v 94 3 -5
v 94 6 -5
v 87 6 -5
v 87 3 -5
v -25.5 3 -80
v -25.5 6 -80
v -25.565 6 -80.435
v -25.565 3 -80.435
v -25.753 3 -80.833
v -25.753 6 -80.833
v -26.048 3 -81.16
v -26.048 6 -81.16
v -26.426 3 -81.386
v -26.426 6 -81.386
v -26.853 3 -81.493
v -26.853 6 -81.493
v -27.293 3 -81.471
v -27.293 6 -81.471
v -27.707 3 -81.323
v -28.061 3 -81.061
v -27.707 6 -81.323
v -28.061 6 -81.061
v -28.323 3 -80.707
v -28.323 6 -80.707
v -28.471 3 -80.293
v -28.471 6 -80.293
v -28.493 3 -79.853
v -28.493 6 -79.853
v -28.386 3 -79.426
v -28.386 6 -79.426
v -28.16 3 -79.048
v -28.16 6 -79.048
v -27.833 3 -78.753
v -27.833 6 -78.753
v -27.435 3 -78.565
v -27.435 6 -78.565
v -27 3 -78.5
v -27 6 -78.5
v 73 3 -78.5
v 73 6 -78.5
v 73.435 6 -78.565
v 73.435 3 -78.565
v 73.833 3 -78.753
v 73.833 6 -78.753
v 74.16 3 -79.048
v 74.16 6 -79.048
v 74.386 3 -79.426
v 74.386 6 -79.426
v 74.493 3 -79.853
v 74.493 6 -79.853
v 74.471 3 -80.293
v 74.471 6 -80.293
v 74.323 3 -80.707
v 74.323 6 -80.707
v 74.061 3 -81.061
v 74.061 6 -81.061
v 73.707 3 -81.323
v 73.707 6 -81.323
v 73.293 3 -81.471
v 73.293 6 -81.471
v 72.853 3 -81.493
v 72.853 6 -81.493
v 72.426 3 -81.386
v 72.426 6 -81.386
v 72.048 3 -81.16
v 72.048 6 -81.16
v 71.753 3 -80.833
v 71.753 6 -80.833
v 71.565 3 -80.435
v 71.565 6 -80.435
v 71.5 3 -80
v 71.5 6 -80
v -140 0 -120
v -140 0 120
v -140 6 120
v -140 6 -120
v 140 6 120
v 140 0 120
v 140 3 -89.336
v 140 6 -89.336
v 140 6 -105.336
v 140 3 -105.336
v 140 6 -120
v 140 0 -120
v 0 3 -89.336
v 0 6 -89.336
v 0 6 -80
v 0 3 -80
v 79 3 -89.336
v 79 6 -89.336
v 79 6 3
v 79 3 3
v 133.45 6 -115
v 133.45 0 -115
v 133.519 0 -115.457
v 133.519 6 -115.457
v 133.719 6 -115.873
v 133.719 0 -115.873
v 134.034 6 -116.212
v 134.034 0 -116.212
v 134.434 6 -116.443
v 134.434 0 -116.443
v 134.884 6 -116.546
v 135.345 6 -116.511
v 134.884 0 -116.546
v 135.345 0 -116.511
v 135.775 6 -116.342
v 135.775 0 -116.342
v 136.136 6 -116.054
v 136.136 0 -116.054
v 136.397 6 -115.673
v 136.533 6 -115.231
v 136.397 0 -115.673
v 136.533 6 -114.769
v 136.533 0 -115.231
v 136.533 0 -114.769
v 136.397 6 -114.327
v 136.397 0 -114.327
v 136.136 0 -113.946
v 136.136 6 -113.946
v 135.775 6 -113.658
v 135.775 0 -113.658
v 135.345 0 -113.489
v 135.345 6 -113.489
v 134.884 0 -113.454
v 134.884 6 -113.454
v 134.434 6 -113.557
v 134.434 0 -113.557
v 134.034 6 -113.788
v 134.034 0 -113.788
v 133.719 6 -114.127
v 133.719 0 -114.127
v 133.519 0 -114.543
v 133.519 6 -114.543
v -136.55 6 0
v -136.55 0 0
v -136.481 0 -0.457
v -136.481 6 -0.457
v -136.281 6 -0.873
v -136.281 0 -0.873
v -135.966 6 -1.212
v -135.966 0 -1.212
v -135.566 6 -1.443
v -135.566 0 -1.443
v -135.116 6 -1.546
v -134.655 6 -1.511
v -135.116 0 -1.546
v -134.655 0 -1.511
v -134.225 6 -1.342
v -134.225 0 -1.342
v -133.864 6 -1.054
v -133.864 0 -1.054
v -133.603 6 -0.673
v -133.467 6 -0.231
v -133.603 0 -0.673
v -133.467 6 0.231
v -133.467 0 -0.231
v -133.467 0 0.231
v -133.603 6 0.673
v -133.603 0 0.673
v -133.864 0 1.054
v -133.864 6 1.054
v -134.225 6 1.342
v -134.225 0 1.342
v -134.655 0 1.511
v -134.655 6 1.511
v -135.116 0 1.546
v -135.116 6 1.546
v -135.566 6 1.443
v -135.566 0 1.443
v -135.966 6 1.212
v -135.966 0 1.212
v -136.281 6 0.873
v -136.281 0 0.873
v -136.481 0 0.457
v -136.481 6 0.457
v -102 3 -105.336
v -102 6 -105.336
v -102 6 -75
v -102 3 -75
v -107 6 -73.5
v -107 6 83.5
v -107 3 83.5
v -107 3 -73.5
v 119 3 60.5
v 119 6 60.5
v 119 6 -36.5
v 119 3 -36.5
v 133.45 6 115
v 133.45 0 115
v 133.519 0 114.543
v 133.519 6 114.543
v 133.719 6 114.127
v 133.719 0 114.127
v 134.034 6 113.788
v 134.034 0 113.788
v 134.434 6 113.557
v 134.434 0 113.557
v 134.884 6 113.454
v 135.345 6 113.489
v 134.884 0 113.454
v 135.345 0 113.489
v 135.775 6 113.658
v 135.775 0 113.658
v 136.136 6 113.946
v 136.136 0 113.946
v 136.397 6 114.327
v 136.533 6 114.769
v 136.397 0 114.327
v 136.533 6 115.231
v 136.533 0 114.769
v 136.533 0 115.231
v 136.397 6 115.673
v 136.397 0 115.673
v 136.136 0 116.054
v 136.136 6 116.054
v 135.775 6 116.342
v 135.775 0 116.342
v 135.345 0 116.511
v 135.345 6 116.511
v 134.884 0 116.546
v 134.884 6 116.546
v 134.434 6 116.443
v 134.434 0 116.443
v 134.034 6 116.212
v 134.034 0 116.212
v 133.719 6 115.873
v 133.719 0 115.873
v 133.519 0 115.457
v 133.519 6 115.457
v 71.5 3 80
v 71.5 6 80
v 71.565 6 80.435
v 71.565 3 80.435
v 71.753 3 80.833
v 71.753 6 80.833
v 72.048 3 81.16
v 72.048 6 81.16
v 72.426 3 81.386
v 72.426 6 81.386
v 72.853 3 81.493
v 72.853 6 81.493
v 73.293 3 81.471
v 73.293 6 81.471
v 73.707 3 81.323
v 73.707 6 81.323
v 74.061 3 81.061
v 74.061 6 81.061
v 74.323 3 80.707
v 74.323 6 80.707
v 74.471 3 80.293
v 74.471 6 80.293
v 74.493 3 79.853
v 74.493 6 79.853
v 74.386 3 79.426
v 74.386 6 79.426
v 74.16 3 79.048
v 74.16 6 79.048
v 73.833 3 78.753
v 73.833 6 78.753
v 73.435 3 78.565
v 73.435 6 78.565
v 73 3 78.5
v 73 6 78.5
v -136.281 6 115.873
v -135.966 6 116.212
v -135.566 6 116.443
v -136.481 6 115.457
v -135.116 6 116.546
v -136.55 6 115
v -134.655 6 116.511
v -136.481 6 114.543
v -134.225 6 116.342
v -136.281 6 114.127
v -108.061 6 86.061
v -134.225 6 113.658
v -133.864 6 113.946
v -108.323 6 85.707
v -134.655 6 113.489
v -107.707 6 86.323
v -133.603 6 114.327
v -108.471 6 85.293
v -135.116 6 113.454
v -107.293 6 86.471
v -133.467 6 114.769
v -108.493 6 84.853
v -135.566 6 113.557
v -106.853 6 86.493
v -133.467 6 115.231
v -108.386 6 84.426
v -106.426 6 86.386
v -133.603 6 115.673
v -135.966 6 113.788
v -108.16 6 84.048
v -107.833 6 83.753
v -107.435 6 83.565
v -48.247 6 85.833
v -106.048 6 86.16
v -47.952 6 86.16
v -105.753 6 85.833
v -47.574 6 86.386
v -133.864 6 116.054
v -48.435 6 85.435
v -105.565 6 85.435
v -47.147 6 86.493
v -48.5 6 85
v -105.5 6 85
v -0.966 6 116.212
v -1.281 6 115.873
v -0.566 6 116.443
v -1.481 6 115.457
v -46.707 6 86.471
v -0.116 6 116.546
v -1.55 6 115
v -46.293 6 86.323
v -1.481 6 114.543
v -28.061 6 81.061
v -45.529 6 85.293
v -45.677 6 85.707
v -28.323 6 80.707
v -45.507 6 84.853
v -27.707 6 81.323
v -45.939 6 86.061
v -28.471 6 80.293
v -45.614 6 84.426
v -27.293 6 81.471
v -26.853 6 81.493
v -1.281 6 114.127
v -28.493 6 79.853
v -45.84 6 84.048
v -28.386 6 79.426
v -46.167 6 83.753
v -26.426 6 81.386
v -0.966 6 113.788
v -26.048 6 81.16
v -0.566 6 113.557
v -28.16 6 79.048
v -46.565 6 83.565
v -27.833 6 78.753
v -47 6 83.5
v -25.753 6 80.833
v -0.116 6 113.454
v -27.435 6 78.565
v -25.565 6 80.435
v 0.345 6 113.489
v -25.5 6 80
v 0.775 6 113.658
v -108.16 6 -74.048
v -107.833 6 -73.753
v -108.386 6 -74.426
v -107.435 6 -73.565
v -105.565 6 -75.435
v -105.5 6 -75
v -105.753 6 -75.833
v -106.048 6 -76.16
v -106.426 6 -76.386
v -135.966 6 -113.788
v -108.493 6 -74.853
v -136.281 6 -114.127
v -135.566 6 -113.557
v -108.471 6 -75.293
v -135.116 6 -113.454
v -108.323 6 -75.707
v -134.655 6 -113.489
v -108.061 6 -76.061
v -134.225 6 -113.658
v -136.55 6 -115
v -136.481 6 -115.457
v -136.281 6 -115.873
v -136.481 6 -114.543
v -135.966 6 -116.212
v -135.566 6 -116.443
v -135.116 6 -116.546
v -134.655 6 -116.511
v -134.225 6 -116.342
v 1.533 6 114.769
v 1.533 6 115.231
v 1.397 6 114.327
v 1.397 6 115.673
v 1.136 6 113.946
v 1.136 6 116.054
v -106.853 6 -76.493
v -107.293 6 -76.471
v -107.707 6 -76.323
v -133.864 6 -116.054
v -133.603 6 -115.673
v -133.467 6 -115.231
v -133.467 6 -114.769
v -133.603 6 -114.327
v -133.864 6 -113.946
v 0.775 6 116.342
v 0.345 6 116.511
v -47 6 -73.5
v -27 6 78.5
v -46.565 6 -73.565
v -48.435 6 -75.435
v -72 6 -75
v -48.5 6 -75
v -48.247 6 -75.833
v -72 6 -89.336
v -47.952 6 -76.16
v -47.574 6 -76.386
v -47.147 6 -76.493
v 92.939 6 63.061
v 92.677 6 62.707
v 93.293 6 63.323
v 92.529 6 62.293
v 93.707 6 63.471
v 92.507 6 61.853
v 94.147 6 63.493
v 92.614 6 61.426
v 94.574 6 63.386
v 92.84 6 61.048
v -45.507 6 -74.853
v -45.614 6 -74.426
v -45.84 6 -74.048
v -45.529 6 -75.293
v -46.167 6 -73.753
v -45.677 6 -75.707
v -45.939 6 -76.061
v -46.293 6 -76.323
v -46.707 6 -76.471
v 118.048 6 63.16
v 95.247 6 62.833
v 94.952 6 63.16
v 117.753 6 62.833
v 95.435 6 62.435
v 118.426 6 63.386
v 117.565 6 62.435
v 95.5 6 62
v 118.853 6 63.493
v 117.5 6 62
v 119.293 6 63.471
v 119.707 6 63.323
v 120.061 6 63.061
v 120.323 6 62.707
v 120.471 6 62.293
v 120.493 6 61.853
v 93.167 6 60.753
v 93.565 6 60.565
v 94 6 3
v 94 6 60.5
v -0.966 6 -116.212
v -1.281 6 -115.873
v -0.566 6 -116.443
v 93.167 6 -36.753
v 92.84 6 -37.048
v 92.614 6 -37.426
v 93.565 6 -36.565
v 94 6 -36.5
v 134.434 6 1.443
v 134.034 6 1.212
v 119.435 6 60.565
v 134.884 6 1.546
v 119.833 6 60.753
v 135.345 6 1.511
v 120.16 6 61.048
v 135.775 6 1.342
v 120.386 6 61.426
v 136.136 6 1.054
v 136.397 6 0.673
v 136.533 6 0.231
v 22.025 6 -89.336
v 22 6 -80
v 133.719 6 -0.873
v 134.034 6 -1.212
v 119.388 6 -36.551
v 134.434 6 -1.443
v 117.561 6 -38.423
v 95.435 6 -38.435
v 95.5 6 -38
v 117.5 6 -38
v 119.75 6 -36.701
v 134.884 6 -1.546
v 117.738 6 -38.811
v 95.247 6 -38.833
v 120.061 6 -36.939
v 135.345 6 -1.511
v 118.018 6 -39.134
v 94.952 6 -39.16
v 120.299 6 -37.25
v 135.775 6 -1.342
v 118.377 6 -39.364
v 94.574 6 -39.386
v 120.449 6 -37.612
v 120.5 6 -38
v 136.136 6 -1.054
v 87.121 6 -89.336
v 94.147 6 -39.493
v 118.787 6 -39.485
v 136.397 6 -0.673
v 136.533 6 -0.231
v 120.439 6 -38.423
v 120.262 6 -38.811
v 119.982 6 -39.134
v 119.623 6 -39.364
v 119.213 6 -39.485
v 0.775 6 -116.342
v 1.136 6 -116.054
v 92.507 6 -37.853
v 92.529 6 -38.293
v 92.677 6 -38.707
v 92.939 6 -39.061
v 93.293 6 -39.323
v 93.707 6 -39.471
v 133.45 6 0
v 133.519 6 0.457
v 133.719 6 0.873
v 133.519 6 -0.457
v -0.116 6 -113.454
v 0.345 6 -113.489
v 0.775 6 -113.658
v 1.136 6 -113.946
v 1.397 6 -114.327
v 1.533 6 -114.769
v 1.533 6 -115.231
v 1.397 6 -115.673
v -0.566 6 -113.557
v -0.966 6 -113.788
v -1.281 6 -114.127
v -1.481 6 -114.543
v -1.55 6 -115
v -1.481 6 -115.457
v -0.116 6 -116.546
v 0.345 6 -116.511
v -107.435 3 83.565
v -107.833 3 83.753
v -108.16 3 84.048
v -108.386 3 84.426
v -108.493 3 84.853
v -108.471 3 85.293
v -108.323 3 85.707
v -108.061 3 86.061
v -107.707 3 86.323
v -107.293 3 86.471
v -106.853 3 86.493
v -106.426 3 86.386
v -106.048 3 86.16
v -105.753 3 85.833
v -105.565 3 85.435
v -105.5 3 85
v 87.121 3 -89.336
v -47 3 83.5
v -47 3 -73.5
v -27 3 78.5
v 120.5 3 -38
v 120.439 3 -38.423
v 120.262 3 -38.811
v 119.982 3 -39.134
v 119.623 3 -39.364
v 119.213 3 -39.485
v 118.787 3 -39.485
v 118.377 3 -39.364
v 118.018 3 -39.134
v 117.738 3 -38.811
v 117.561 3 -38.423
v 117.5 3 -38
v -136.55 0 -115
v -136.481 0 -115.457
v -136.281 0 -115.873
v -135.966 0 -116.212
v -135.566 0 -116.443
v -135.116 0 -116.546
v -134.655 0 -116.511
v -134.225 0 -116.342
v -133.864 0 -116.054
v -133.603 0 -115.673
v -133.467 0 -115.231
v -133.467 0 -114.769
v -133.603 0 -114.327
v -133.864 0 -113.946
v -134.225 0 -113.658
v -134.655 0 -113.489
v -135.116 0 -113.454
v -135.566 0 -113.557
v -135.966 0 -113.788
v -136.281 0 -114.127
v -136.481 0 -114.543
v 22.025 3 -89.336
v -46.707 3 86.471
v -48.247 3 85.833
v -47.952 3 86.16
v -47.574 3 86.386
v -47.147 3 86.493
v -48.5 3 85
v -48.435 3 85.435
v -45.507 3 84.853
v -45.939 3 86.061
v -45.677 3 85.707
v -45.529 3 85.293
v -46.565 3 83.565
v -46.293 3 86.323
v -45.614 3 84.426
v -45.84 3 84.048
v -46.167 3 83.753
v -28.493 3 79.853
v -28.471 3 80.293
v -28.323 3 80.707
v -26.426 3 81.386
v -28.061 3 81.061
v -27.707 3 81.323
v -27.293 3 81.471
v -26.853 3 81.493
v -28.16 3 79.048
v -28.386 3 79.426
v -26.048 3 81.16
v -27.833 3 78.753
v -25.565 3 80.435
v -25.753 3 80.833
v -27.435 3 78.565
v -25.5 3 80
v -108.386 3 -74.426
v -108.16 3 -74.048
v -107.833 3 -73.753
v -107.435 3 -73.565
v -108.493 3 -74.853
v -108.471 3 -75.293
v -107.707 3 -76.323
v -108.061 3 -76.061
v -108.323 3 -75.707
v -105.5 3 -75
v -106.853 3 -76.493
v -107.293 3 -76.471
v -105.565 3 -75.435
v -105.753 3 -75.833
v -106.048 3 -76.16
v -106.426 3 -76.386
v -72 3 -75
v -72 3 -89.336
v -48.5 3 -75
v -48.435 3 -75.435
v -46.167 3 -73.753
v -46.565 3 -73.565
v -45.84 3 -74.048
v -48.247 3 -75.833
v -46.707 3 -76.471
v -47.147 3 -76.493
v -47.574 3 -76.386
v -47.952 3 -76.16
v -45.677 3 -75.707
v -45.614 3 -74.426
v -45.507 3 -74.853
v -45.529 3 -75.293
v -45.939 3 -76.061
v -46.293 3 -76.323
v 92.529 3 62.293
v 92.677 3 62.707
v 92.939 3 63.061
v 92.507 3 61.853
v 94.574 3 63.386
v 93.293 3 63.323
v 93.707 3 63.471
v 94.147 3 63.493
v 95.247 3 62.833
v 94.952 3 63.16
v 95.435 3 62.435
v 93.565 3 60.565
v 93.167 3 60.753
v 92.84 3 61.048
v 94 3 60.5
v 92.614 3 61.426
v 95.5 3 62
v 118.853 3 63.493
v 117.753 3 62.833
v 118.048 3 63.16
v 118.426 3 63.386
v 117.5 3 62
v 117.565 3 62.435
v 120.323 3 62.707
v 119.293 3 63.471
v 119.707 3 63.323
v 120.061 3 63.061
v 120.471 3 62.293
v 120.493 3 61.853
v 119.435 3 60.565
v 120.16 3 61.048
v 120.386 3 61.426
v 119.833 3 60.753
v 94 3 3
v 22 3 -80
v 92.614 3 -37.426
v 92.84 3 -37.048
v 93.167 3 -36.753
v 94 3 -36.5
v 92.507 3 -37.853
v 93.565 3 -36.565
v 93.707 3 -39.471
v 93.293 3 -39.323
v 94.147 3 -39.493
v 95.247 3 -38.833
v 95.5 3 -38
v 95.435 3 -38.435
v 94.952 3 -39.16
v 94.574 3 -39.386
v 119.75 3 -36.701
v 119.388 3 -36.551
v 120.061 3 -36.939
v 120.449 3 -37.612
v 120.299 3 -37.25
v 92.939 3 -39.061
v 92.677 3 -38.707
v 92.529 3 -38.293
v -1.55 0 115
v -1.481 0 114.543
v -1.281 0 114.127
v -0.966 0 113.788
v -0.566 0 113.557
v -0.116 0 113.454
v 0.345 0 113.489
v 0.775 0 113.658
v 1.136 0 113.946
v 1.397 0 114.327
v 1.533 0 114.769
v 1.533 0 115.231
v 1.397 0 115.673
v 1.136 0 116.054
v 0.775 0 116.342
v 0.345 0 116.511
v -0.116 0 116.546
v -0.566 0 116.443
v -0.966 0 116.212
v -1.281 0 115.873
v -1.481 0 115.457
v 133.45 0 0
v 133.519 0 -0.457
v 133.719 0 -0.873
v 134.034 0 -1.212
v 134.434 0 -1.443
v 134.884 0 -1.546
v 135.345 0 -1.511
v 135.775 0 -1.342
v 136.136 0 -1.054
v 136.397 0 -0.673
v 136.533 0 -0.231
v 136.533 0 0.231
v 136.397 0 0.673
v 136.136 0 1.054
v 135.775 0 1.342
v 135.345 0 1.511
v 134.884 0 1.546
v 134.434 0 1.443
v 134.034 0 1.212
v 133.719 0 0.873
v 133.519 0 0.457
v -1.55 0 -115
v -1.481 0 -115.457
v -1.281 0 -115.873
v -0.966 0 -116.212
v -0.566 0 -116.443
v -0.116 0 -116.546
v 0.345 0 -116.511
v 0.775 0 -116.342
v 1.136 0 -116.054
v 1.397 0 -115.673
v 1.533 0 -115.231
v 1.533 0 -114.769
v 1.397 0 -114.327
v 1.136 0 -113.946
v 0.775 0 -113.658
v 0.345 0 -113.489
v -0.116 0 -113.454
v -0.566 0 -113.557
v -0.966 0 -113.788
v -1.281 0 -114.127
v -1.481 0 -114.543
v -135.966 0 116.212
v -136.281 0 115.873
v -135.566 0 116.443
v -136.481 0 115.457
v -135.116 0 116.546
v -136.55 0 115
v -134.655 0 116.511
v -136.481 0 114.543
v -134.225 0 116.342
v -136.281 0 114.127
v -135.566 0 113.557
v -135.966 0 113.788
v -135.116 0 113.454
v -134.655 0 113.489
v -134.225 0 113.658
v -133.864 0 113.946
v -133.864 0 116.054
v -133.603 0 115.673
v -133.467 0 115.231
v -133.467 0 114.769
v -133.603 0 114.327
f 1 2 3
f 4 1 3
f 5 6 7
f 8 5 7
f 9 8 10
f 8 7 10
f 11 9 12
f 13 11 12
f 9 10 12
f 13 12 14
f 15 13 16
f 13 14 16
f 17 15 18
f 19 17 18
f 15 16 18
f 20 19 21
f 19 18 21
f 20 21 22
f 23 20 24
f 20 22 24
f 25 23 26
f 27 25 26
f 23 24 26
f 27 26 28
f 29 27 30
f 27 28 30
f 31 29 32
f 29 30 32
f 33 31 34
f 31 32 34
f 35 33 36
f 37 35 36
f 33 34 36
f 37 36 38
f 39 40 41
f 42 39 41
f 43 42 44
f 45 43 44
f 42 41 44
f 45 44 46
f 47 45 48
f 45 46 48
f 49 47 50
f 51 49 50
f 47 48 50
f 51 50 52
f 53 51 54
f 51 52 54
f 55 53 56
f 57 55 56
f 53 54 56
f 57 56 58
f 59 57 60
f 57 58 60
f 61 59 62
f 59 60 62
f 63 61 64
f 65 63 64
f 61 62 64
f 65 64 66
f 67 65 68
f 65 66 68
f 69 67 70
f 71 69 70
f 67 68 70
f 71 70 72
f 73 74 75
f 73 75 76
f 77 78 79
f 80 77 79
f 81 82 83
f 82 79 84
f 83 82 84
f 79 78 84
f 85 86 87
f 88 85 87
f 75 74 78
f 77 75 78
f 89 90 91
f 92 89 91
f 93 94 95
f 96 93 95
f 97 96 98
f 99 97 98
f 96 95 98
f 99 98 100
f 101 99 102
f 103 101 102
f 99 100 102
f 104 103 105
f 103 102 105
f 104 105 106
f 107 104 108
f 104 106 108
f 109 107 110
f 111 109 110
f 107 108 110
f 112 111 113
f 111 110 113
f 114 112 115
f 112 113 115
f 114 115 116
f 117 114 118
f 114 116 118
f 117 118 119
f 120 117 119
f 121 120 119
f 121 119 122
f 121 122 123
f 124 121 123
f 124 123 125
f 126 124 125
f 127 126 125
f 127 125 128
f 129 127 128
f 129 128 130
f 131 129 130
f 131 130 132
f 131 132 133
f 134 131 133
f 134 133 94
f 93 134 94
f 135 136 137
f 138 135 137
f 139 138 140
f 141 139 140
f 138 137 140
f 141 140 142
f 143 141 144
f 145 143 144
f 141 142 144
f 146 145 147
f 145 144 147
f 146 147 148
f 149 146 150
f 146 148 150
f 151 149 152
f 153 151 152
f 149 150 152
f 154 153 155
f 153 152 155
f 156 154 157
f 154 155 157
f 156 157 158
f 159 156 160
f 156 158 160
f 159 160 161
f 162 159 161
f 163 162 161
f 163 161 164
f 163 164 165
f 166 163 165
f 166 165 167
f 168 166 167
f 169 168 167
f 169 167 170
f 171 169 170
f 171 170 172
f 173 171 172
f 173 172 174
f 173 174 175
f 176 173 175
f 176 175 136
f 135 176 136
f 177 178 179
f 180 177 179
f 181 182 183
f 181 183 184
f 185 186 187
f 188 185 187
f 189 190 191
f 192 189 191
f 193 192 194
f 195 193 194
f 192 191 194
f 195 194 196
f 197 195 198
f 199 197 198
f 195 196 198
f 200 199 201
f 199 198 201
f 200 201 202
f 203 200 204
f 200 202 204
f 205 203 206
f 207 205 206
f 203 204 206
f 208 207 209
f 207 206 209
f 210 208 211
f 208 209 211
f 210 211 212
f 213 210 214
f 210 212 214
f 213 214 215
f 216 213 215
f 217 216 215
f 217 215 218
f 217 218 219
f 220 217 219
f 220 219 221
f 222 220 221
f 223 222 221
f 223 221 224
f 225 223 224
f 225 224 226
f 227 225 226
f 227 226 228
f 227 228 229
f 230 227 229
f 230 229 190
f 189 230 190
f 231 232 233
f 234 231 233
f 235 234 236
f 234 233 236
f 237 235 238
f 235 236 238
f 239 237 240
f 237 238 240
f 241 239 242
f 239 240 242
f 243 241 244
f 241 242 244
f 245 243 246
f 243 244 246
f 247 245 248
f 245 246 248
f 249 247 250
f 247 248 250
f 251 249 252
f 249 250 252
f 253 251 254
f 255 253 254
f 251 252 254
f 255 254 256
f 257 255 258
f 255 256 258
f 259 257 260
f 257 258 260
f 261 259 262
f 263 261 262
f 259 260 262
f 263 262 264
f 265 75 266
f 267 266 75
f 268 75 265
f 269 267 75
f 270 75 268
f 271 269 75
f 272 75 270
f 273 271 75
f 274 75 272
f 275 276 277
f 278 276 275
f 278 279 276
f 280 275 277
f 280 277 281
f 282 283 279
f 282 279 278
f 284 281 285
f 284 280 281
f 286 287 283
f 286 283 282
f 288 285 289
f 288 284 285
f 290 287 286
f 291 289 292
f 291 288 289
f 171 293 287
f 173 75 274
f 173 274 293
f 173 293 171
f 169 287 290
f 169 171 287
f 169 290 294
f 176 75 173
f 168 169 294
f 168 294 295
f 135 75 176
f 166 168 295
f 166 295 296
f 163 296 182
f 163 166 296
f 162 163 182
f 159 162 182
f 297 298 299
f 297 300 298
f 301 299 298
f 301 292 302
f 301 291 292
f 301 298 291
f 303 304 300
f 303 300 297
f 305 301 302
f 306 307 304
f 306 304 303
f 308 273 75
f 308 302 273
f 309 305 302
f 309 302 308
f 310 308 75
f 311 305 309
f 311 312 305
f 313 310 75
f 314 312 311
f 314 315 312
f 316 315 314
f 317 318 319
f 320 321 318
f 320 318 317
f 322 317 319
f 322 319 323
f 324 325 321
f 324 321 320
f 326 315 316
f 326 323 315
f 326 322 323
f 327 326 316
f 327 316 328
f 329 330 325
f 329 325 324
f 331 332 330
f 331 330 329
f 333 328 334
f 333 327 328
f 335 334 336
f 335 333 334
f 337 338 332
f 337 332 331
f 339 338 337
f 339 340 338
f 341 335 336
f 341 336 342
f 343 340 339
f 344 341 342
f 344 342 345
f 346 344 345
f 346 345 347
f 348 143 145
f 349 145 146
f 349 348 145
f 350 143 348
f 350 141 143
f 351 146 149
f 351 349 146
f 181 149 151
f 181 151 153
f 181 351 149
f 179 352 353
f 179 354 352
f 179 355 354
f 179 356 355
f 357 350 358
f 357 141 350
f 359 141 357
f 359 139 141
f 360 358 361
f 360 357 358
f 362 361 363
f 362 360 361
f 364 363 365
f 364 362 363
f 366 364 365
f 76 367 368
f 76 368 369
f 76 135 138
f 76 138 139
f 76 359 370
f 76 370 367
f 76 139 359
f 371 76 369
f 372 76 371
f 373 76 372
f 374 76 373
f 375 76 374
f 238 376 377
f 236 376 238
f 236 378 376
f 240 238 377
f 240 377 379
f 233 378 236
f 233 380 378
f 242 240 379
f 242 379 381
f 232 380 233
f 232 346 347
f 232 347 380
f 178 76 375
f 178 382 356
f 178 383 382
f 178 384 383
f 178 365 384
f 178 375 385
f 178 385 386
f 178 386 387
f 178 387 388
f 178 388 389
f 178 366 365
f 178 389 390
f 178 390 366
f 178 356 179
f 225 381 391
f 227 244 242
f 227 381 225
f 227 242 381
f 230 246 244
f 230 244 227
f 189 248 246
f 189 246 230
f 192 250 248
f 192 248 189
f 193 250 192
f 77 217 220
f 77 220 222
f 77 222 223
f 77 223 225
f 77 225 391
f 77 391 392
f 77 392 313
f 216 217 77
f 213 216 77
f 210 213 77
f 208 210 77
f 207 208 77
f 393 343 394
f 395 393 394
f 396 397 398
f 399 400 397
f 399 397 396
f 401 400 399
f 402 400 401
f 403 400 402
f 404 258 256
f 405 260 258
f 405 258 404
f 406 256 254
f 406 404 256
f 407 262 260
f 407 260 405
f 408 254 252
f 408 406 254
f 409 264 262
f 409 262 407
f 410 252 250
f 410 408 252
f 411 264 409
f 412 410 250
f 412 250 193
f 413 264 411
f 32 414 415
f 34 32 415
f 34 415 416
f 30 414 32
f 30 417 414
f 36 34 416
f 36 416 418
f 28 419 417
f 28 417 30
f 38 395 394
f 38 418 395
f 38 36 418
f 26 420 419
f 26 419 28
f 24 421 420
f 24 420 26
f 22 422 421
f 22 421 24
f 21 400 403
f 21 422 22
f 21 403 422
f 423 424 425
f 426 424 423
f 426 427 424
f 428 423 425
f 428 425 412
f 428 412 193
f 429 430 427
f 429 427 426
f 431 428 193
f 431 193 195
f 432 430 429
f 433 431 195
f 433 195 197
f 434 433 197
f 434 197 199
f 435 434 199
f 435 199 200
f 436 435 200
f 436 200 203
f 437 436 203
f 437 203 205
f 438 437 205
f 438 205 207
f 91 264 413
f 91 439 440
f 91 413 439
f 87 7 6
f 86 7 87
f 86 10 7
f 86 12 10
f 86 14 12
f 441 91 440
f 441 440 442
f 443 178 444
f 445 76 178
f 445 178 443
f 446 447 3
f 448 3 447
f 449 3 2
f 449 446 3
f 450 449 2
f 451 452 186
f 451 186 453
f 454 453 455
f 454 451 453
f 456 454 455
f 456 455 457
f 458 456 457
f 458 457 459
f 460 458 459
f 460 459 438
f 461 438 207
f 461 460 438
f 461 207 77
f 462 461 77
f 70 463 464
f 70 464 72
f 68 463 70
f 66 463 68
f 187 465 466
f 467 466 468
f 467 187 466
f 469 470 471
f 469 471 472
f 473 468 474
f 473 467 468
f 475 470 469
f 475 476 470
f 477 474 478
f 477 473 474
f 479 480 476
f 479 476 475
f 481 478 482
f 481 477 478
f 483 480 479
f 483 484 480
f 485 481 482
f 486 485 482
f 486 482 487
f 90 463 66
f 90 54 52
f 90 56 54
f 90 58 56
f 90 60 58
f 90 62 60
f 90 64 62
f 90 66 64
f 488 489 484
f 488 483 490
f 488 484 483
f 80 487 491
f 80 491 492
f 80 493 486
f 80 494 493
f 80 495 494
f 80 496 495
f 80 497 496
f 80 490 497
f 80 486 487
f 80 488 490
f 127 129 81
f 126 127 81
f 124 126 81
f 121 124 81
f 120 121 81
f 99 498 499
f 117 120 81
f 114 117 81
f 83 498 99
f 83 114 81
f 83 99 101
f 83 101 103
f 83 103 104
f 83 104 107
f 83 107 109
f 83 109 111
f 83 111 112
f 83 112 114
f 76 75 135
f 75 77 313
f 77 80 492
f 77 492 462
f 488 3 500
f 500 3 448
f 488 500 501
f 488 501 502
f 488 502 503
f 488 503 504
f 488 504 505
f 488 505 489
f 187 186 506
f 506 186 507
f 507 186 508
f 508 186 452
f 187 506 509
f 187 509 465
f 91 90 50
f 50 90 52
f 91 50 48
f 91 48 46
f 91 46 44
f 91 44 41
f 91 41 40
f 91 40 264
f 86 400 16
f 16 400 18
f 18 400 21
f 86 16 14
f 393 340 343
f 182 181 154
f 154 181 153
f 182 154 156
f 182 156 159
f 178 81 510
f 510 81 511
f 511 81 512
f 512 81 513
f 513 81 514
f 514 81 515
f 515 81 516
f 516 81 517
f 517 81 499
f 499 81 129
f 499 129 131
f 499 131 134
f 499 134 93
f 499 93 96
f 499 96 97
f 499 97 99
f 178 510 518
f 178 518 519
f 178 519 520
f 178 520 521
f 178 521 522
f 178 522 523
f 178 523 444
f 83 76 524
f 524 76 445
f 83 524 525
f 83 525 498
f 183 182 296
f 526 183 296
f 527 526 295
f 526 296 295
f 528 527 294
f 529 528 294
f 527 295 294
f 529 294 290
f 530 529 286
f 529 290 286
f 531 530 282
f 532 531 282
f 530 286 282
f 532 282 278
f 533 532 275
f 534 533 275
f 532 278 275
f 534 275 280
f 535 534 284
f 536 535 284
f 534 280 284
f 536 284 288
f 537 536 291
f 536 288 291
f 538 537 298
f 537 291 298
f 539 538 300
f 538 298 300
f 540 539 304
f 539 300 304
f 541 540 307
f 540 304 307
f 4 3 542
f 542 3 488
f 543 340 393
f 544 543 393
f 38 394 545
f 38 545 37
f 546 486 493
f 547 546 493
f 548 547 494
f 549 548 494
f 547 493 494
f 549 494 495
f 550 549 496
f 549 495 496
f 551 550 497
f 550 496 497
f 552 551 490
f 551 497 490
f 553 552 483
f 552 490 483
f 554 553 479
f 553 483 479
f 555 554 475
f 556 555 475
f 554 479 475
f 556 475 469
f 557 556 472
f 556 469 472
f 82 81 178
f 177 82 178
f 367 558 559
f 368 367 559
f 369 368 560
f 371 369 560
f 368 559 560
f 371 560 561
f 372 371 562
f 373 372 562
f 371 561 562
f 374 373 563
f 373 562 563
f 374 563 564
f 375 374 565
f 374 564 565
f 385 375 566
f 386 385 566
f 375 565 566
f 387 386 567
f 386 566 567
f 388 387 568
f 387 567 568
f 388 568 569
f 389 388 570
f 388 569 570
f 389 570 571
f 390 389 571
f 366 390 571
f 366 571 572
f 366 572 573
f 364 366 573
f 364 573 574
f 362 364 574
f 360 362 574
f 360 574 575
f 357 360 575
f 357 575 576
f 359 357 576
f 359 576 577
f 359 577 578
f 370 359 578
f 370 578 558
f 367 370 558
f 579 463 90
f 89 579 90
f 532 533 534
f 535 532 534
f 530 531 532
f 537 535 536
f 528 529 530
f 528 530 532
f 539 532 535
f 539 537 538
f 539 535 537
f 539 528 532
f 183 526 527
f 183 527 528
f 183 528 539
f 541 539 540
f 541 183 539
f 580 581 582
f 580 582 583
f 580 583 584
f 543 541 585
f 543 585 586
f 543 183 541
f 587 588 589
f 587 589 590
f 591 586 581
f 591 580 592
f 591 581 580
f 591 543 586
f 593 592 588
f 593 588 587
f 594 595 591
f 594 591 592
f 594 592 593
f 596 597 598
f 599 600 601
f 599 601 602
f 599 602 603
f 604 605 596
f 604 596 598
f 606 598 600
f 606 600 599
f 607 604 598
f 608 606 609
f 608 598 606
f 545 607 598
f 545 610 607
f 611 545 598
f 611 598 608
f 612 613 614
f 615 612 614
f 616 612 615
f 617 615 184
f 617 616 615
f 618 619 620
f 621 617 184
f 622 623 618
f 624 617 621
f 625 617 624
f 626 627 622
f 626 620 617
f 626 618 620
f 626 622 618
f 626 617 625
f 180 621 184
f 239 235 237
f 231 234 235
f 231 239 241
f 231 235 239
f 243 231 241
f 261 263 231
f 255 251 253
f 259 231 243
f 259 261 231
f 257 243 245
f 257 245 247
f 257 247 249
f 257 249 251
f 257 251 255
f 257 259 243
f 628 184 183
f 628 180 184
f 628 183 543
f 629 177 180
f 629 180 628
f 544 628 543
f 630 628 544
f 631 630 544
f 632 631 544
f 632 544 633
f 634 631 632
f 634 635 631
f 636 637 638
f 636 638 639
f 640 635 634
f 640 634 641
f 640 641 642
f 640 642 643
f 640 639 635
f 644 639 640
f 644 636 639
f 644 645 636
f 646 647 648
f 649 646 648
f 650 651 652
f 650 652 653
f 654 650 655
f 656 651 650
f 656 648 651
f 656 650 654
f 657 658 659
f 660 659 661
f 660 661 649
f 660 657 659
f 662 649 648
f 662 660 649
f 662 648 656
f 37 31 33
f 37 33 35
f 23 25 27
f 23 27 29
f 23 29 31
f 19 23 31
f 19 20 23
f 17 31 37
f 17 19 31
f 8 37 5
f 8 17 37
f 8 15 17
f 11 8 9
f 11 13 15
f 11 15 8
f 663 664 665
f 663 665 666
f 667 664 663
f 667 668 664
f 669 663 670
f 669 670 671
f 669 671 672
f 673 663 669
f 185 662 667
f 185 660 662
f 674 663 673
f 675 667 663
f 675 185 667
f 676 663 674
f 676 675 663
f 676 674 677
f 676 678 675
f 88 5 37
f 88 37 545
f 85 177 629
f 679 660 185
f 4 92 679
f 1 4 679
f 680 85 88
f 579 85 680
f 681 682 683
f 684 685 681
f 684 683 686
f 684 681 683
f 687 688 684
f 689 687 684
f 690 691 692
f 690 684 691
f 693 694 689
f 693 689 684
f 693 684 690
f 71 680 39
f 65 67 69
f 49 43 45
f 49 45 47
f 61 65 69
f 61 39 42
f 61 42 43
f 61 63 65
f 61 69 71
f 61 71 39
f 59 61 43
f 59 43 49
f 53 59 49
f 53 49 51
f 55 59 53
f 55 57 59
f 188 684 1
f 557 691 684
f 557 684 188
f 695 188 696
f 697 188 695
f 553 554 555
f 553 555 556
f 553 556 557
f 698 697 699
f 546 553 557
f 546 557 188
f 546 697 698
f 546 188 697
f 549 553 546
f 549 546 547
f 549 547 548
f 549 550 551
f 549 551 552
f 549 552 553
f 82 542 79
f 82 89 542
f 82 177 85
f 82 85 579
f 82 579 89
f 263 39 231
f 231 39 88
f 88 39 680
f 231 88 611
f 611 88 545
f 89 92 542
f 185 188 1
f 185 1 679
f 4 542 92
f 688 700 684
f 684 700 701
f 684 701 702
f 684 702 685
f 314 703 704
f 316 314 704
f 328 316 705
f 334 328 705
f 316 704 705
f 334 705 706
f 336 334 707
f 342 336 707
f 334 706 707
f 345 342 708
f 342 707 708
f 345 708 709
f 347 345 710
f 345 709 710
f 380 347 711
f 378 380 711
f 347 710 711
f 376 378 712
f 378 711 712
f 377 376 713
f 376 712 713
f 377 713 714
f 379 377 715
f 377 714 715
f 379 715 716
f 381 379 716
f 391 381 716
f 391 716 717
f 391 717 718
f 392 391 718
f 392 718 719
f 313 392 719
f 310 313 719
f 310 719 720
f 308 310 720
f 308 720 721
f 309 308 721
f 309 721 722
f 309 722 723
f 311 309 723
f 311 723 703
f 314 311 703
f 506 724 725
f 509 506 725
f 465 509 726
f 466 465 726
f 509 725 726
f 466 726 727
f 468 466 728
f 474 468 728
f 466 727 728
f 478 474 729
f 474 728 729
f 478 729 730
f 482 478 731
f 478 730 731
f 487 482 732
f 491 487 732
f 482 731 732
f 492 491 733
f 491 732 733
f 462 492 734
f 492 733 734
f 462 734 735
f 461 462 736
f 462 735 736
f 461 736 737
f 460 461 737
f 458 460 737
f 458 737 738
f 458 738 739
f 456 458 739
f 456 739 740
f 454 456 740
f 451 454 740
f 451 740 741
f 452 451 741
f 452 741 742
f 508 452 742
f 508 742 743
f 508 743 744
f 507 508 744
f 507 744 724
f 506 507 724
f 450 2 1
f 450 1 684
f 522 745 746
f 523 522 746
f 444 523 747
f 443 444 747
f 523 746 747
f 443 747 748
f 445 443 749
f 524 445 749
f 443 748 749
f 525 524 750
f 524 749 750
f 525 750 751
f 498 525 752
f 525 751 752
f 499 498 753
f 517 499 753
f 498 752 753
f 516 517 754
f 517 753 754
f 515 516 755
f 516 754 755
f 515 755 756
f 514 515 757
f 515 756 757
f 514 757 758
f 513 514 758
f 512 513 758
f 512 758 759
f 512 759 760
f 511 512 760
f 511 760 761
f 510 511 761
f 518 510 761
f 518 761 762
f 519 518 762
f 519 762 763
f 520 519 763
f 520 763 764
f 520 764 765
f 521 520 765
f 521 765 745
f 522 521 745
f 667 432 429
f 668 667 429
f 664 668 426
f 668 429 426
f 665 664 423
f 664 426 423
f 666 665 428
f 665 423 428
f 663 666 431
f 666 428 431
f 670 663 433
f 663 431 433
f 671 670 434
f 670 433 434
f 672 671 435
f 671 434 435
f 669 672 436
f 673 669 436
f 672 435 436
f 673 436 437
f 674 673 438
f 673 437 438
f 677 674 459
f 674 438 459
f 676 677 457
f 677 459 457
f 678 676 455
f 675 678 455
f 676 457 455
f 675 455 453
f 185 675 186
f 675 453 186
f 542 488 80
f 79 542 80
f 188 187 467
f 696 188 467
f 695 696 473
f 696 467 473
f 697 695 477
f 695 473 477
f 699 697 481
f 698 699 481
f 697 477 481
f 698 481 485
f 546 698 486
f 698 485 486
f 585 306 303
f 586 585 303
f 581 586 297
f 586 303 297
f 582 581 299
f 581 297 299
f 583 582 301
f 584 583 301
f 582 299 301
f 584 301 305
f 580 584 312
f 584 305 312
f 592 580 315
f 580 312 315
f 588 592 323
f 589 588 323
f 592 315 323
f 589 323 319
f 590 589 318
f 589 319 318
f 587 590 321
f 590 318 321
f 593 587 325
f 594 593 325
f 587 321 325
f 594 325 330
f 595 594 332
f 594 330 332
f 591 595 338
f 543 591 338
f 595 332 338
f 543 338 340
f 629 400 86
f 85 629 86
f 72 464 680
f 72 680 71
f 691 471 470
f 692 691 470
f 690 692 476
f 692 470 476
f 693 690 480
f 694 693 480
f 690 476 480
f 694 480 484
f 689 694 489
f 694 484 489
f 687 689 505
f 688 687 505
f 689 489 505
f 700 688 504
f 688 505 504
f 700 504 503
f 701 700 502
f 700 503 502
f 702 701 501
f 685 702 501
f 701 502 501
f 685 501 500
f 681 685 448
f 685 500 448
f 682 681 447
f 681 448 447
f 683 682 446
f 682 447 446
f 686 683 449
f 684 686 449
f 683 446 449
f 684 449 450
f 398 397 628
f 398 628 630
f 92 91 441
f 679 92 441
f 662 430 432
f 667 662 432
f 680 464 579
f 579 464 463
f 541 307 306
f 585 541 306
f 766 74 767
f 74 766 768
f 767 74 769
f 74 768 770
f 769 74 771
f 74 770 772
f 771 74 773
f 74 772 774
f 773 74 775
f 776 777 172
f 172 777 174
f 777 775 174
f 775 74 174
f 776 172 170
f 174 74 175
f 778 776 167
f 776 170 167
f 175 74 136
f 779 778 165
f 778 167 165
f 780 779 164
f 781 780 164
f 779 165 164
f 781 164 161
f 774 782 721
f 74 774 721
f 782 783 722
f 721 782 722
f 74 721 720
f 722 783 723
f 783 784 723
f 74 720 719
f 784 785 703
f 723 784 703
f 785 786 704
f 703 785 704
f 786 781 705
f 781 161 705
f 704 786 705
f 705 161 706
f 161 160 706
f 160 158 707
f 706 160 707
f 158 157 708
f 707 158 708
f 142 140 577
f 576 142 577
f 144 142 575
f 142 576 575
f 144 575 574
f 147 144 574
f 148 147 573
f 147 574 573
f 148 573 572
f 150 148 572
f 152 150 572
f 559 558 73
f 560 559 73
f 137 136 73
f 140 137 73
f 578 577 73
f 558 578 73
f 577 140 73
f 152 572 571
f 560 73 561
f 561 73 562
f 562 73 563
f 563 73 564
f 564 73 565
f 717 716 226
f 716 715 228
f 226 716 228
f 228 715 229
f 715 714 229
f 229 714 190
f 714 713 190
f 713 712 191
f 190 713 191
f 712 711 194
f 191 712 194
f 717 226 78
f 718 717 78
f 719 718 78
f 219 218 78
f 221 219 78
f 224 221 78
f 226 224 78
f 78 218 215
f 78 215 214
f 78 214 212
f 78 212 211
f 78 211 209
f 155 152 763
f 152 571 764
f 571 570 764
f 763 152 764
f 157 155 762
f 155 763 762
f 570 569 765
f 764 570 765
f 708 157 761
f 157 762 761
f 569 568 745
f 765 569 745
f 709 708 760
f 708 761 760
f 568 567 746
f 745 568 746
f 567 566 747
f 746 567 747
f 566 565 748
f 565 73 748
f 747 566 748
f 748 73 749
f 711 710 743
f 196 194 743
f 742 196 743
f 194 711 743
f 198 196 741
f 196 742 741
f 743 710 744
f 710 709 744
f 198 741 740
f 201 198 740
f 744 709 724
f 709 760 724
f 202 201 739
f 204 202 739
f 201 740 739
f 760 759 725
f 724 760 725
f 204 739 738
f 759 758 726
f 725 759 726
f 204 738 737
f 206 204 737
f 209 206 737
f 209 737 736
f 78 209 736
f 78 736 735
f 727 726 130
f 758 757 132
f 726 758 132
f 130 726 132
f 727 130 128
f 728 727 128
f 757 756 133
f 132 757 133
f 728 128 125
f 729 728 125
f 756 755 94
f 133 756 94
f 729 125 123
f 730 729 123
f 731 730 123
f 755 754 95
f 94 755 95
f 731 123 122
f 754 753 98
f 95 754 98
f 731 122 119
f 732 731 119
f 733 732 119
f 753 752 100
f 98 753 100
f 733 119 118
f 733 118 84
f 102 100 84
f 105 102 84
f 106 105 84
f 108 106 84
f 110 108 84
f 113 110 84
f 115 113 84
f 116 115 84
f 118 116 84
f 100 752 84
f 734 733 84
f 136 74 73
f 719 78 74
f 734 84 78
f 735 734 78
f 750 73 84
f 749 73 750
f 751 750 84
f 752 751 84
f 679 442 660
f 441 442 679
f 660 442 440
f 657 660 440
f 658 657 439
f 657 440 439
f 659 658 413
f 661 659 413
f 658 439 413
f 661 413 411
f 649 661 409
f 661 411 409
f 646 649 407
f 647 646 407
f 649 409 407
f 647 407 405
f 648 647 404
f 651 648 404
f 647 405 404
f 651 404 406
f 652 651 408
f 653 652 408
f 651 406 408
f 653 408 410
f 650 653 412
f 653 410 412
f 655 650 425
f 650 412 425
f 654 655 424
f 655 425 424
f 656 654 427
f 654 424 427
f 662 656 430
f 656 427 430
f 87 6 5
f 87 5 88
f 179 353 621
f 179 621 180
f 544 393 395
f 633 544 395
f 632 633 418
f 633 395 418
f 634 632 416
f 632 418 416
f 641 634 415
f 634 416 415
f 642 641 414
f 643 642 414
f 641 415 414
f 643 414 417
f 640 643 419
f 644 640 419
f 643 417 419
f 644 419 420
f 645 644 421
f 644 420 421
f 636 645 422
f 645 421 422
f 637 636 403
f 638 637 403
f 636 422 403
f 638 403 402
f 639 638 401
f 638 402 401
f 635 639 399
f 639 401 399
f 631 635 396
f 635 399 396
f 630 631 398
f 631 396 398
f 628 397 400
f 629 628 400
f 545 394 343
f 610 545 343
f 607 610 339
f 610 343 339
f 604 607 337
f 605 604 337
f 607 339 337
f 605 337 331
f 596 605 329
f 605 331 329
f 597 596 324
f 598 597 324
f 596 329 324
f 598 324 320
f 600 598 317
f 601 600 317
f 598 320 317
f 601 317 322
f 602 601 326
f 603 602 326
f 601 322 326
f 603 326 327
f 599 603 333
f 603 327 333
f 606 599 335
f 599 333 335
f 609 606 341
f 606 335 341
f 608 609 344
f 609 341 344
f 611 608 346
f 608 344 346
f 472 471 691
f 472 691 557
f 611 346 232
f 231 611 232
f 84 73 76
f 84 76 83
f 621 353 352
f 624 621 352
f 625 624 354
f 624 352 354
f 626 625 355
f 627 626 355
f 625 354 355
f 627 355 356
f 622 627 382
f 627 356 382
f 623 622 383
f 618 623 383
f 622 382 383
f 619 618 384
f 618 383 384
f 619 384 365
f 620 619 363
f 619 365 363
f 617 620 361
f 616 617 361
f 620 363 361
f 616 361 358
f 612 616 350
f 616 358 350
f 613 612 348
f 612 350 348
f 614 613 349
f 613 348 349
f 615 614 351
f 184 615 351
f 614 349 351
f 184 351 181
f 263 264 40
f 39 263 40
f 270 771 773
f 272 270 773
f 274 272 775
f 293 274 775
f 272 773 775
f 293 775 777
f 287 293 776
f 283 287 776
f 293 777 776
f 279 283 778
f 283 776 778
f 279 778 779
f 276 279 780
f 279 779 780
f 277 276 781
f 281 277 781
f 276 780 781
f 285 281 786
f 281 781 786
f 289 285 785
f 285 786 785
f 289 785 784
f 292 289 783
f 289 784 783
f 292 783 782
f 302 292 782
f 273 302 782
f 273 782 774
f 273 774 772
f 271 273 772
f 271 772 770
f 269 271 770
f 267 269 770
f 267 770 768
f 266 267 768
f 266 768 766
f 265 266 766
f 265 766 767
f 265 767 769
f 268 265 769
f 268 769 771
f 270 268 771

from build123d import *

# Parameters (mm, degrees)
SKETCH_1_W                  = 280
SKETCH_1_H                  = 240
EXTRUDE_1_DEPTH             = 6
HOLE_WIZARD_3_1_3_1_1_D     = 3.1
HOLE_WIZARD_3_1_3_1_1_DEPTH = 10
HOLE_WIZARD_3_1_3_1_1_TIP   = 0.931333959
SKETCH_7_R                  = 1.5
SKETCH_7_W                  = 25
SKETCH_7_H                  = 100
SKETCH_7_W_2                = 100
SKETCH_7_H_2                = 160
SKETCH_7_W_3                = 60
CUT_EXTRUDE_1_DEPTH         = 3
CUT_EXTRUDE_2_DEPTH         = 3


with BuildPart() as part:
    # Эскиз1 → Бобышка-Вытянуть1 (new body)
    with BuildSketch(Plane(origin=(0, 0, 0), x_dir=(1, 0, 0), z_dir=(0, 1, 0))):
        Rectangle(SKETCH_1_W, SKETCH_1_H)
    extrude(amount=EXTRUDE_1_DEPTH)

    # Диаметр отверстия Ø3.1 (3.1)1
    with Locations(Plane(origin=(0, 6, 0), x_dir=(1, 0, 0), z_dir=(0, 1, 0))):
        with Locations((-135, 115), (0, 115), (135, 115), (135, 0), (135, -115), (0, -115), (-135, -115), (-135, 0), (401.523177345, 110.995095939)):
            Hole(HOLE_WIZARD_3_1_3_1_1_D / 2, depth=HOLE_WIZARD_3_1_3_1_1_DEPTH)
            with Locations((0, 0, -(HOLE_WIZARD_3_1_3_1_1_DEPTH + HOLE_WIZARD_3_1_3_1_1_TIP / 2))):  # 118° drill point
                Cone(0, HOLE_WIZARD_3_1_3_1_1_D / 2, HOLE_WIZARD_3_1_3_1_1_TIP, mode=Mode.SUBTRACT)

    # Эскиз7 → Вырез-Вытянуть1 (cut)
    with BuildSketch(Plane(origin=(0, 6, 0), x_dir=(1, 0, 0), z_dir=(0, 1, 0))):
        with BuildLine():
            ThreePointArc((120.5, 38), (119, 39.5), (117.5, 38))
            Line((117.5, 38), (119, 38))
            Line((119, 38), (119, 36.5))
            ThreePointArc((119, 36.5), (120.060660172, 36.939339828), (120.5, 38))
        make_face()
        with BuildLine():
            Line((119, 38), (117.5, 38))
            ThreePointArc((117.5, 38), (117.939339828, 36.939339828), (119, 36.5))
            Line((119, 36.5), (119, 38))
        make_face()
        with Locations((94, 38)):
            Circle(SKETCH_7_R)
        with Locations((94, -62)):
            Circle(SKETCH_7_R)
        with Locations((119, -62)):
            Circle(SKETCH_7_R)
        with Locations((119, 38)):
            Circle(SKETCH_7_R)
        with Locations((106.5, -12)):
            Rectangle(SKETCH_7_W, SKETCH_7_H)
        with BuildLine():
            ThreePointArc((94, 36.5), (95.060660172, 36.939339828), (95.5, 38))
            Line((95.5, 38), (94, 38))
            Line((94, 38), (94, 36.5))
        make_face()
        with BuildLine():
            Line((94, 38), (95.5, 38))
            ThreePointArc((95.5, 38), (92.939339828, 39.060660172), (94, 36.5))
            Line((94, 36.5), (94, 38))
        make_face()
        with BuildLine():
            ThreePointArc((95.5, -62), (95.060660172, -60.939339828), (94, -60.5))
            Line((94, -60.5), (94, -62))
            Line((94, -62), (95.5, -62))
        make_face()
        with BuildLine():
            Line((94, -62), (94, -60.5))
            ThreePointArc((94, -60.5), (92.939339828, -63.060660172), (95.5, -62))
            Line((95.5, -62), (94, -62))
        make_face()
        with BuildLine():
            ThreePointArc((120.5, -62), (120.060660172, -60.939339828), (119, -60.5))
            Line((119, -60.5), (119, -62))
            Line((119, -62), (117.5, -62))
            ThreePointArc((117.5, -62), (119, -63.5), (120.5, -62))
        make_face()
        with BuildLine():
            Line((119, -62), (119, -60.5))
            ThreePointArc((119, -60.5), (117.939339828, -60.939339828), (117.5, -62))
            Line((117.5, -62), (119, -62))
        make_face()
        with Locations((-27, 80)):
            Circle(SKETCH_7_R)
        with Locations((-27, -80)):
            Circle(SKETCH_7_R)
        with Locations((73, -80)):
            Circle(SKETCH_7_R)
        with Locations((73, 80)):
            Circle(SKETCH_7_R)
        with Locations((23, 0)):
            Rectangle(SKETCH_7_W_2, SKETCH_7_H_2)
        with Locations((-107, -85)):
            Circle(SKETCH_7_R)
        with Locations((-47, -85)):
            Circle(SKETCH_7_R)
        with Locations((-47, 75)):
            Circle(SKETCH_7_R)
        with Locations((-107, 75)):
            Circle(SKETCH_7_R)
        with Locations((-77, -5)):
            Rectangle(SKETCH_7_W_3, SKETCH_7_H_2)
        with BuildLine():
            ThreePointArc((74.5, 80), (73, 81.5), (71.5, 80))
            Line((71.5, 80), (73, 80))
            Line((73, 80), (73, 78.5))
            ThreePointArc((73, 78.5), (74.060660172, 78.939339828), (74.5, 80))
        make_face()
        with BuildLine():
            Line((73, 80), (71.5, 80))
            ThreePointArc((71.5, 80), (71.939339828, 78.939339828), (73, 78.5))
            Line((73, 78.5), (73, 80))
        make_face()
        with BuildLine():
            ThreePointArc((74.5, -80), (74.060660172, -78.939339828), (73, -78.5))
            Line((73, -78.5), (73, -80))
            Line((73, -80), (71.5, -80))
            ThreePointArc((71.5, -80), (73, -81.5), (74.5, -80))
        make_face()
        with BuildLine():
            Line((73, -80), (73, -78.5))
            ThreePointArc((73, -78.5), (71.939339828, -78.939339828), (71.5, -80))
            Line((71.5, -80), (73, -80))
        make_face()
        with BuildLine():
            ThreePointArc((-25.5, -80), (-25.939339828, -78.939339828), (-27, -78.5))
            Line((-27, -78.5), (-27, -80))
            Line((-27, -80), (-25.5, -80))
        make_face()
        with BuildLine():
            Line((-27, -80), (-27, -78.5))
            ThreePointArc((-27, -78.5), (-28.060660172, -81.060660172), (-25.5, -80))
            Line((-25.5, -80), (-27, -80))
        make_face()
        with BuildLine():
            ThreePointArc((-27, 78.5), (-25.939339828, 78.939339828), (-25.5, 80))
            Line((-25.5, 80), (-27, 80))
            Line((-27, 80), (-27, 78.5))
        make_face()
        with BuildLine():
            Line((-27, 80), (-25.5, 80))
            ThreePointArc((-25.5, 80), (-28.060660172, 81.060660172), (-27, 78.5))
            Line((-27, 78.5), (-27, 80))
        make_face()
        with BuildLine():
            ThreePointArc((-45.5, 75), (-47, 76.5), (-48.5, 75))
            Line((-48.5, 75), (-47, 75))
            Line((-47, 75), (-47, 73.5))
            ThreePointArc((-47, 73.5), (-45.939339828, 73.939339828), (-45.5, 75))
        make_face()
        with BuildLine():
            Line((-47, 75), (-48.5, 75))
            ThreePointArc((-48.5, 75), (-48.060660172, 73.939339828), (-47, 73.5))
            Line((-47, 73.5), (-47, 75))
        make_face()
        with BuildLine():
            ThreePointArc((-45.5, -85), (-45.939339828, -83.939339828), (-47, -83.5))
            Line((-47, -83.5), (-47, -85))
            Line((-47, -85), (-48.5, -85))
            ThreePointArc((-48.5, -85), (-47, -86.5), (-45.5, -85))
        make_face()
        with BuildLine():
            Line((-47, -85), (-47, -83.5))
            ThreePointArc((-47, -83.5), (-48.060660172, -83.939339828), (-48.5, -85))
            Line((-48.5, -85), (-47, -85))
        make_face()
        with BuildLine():
            ThreePointArc((-105.5, -85), (-105.939339828, -83.939339828), (-107, -83.5))
            Line((-107, -83.5), (-107, -85))
            Line((-107, -85), (-105.5, -85))
        make_face()
        with BuildLine():
            Line((-107, -85), (-107, -83.5))
            ThreePointArc((-107, -83.5), (-108.060660172, -86.060660172), (-105.5, -85))
            Line((-105.5, -85), (-107, -85))
        make_face()
        with BuildLine():
            ThreePointArc((-107, 73.5), (-105.939339828, 73.939339828), (-105.5, 75))
            Line((-105.5, 75), (-107, 75))
            Line((-107, 75), (-107, 73.5))
        make_face()
        with BuildLine():
            Line((-107, 75), (-105.5, 75))
            ThreePointArc((-105.5, 75), (-108.060660172, 76.060660172), (-107, 73.5))
            Line((-107, 73.5), (-107, 75))
        make_face()
    extrude(amount=-CUT_EXTRUDE_1_DEPTH, mode=Mode.SUBTRACT)

    # Эскиз8 → Вырез-Вытянуть2 (cut)
    with BuildSketch(Plane(origin=(0, 6, 0), x_dir=(1, 0, 0), z_dir=(0, 1, 0))):
        Polygon((87.121057206, 89.335537533), (140, 89.335537533), (140, 105.335537533), (22, 105.335537533), (-42.979723536, 105.335537533), (-102, 105.335537533), (-102, 89.335537533), (-102, 75), (-72, 75), (-72, 89.335537533), (0, 89.335537533), (0, 80), (22, 80), (22.024724926, 89.335537533), (79, 89.335537533), (79, -3), (94, -3), (94, 5), (87, 5), align=None)
    extrude(amount=-CUT_EXTRUDE_2_DEPTH, mode=Mode.SUBTRACT)


solid = part.part
